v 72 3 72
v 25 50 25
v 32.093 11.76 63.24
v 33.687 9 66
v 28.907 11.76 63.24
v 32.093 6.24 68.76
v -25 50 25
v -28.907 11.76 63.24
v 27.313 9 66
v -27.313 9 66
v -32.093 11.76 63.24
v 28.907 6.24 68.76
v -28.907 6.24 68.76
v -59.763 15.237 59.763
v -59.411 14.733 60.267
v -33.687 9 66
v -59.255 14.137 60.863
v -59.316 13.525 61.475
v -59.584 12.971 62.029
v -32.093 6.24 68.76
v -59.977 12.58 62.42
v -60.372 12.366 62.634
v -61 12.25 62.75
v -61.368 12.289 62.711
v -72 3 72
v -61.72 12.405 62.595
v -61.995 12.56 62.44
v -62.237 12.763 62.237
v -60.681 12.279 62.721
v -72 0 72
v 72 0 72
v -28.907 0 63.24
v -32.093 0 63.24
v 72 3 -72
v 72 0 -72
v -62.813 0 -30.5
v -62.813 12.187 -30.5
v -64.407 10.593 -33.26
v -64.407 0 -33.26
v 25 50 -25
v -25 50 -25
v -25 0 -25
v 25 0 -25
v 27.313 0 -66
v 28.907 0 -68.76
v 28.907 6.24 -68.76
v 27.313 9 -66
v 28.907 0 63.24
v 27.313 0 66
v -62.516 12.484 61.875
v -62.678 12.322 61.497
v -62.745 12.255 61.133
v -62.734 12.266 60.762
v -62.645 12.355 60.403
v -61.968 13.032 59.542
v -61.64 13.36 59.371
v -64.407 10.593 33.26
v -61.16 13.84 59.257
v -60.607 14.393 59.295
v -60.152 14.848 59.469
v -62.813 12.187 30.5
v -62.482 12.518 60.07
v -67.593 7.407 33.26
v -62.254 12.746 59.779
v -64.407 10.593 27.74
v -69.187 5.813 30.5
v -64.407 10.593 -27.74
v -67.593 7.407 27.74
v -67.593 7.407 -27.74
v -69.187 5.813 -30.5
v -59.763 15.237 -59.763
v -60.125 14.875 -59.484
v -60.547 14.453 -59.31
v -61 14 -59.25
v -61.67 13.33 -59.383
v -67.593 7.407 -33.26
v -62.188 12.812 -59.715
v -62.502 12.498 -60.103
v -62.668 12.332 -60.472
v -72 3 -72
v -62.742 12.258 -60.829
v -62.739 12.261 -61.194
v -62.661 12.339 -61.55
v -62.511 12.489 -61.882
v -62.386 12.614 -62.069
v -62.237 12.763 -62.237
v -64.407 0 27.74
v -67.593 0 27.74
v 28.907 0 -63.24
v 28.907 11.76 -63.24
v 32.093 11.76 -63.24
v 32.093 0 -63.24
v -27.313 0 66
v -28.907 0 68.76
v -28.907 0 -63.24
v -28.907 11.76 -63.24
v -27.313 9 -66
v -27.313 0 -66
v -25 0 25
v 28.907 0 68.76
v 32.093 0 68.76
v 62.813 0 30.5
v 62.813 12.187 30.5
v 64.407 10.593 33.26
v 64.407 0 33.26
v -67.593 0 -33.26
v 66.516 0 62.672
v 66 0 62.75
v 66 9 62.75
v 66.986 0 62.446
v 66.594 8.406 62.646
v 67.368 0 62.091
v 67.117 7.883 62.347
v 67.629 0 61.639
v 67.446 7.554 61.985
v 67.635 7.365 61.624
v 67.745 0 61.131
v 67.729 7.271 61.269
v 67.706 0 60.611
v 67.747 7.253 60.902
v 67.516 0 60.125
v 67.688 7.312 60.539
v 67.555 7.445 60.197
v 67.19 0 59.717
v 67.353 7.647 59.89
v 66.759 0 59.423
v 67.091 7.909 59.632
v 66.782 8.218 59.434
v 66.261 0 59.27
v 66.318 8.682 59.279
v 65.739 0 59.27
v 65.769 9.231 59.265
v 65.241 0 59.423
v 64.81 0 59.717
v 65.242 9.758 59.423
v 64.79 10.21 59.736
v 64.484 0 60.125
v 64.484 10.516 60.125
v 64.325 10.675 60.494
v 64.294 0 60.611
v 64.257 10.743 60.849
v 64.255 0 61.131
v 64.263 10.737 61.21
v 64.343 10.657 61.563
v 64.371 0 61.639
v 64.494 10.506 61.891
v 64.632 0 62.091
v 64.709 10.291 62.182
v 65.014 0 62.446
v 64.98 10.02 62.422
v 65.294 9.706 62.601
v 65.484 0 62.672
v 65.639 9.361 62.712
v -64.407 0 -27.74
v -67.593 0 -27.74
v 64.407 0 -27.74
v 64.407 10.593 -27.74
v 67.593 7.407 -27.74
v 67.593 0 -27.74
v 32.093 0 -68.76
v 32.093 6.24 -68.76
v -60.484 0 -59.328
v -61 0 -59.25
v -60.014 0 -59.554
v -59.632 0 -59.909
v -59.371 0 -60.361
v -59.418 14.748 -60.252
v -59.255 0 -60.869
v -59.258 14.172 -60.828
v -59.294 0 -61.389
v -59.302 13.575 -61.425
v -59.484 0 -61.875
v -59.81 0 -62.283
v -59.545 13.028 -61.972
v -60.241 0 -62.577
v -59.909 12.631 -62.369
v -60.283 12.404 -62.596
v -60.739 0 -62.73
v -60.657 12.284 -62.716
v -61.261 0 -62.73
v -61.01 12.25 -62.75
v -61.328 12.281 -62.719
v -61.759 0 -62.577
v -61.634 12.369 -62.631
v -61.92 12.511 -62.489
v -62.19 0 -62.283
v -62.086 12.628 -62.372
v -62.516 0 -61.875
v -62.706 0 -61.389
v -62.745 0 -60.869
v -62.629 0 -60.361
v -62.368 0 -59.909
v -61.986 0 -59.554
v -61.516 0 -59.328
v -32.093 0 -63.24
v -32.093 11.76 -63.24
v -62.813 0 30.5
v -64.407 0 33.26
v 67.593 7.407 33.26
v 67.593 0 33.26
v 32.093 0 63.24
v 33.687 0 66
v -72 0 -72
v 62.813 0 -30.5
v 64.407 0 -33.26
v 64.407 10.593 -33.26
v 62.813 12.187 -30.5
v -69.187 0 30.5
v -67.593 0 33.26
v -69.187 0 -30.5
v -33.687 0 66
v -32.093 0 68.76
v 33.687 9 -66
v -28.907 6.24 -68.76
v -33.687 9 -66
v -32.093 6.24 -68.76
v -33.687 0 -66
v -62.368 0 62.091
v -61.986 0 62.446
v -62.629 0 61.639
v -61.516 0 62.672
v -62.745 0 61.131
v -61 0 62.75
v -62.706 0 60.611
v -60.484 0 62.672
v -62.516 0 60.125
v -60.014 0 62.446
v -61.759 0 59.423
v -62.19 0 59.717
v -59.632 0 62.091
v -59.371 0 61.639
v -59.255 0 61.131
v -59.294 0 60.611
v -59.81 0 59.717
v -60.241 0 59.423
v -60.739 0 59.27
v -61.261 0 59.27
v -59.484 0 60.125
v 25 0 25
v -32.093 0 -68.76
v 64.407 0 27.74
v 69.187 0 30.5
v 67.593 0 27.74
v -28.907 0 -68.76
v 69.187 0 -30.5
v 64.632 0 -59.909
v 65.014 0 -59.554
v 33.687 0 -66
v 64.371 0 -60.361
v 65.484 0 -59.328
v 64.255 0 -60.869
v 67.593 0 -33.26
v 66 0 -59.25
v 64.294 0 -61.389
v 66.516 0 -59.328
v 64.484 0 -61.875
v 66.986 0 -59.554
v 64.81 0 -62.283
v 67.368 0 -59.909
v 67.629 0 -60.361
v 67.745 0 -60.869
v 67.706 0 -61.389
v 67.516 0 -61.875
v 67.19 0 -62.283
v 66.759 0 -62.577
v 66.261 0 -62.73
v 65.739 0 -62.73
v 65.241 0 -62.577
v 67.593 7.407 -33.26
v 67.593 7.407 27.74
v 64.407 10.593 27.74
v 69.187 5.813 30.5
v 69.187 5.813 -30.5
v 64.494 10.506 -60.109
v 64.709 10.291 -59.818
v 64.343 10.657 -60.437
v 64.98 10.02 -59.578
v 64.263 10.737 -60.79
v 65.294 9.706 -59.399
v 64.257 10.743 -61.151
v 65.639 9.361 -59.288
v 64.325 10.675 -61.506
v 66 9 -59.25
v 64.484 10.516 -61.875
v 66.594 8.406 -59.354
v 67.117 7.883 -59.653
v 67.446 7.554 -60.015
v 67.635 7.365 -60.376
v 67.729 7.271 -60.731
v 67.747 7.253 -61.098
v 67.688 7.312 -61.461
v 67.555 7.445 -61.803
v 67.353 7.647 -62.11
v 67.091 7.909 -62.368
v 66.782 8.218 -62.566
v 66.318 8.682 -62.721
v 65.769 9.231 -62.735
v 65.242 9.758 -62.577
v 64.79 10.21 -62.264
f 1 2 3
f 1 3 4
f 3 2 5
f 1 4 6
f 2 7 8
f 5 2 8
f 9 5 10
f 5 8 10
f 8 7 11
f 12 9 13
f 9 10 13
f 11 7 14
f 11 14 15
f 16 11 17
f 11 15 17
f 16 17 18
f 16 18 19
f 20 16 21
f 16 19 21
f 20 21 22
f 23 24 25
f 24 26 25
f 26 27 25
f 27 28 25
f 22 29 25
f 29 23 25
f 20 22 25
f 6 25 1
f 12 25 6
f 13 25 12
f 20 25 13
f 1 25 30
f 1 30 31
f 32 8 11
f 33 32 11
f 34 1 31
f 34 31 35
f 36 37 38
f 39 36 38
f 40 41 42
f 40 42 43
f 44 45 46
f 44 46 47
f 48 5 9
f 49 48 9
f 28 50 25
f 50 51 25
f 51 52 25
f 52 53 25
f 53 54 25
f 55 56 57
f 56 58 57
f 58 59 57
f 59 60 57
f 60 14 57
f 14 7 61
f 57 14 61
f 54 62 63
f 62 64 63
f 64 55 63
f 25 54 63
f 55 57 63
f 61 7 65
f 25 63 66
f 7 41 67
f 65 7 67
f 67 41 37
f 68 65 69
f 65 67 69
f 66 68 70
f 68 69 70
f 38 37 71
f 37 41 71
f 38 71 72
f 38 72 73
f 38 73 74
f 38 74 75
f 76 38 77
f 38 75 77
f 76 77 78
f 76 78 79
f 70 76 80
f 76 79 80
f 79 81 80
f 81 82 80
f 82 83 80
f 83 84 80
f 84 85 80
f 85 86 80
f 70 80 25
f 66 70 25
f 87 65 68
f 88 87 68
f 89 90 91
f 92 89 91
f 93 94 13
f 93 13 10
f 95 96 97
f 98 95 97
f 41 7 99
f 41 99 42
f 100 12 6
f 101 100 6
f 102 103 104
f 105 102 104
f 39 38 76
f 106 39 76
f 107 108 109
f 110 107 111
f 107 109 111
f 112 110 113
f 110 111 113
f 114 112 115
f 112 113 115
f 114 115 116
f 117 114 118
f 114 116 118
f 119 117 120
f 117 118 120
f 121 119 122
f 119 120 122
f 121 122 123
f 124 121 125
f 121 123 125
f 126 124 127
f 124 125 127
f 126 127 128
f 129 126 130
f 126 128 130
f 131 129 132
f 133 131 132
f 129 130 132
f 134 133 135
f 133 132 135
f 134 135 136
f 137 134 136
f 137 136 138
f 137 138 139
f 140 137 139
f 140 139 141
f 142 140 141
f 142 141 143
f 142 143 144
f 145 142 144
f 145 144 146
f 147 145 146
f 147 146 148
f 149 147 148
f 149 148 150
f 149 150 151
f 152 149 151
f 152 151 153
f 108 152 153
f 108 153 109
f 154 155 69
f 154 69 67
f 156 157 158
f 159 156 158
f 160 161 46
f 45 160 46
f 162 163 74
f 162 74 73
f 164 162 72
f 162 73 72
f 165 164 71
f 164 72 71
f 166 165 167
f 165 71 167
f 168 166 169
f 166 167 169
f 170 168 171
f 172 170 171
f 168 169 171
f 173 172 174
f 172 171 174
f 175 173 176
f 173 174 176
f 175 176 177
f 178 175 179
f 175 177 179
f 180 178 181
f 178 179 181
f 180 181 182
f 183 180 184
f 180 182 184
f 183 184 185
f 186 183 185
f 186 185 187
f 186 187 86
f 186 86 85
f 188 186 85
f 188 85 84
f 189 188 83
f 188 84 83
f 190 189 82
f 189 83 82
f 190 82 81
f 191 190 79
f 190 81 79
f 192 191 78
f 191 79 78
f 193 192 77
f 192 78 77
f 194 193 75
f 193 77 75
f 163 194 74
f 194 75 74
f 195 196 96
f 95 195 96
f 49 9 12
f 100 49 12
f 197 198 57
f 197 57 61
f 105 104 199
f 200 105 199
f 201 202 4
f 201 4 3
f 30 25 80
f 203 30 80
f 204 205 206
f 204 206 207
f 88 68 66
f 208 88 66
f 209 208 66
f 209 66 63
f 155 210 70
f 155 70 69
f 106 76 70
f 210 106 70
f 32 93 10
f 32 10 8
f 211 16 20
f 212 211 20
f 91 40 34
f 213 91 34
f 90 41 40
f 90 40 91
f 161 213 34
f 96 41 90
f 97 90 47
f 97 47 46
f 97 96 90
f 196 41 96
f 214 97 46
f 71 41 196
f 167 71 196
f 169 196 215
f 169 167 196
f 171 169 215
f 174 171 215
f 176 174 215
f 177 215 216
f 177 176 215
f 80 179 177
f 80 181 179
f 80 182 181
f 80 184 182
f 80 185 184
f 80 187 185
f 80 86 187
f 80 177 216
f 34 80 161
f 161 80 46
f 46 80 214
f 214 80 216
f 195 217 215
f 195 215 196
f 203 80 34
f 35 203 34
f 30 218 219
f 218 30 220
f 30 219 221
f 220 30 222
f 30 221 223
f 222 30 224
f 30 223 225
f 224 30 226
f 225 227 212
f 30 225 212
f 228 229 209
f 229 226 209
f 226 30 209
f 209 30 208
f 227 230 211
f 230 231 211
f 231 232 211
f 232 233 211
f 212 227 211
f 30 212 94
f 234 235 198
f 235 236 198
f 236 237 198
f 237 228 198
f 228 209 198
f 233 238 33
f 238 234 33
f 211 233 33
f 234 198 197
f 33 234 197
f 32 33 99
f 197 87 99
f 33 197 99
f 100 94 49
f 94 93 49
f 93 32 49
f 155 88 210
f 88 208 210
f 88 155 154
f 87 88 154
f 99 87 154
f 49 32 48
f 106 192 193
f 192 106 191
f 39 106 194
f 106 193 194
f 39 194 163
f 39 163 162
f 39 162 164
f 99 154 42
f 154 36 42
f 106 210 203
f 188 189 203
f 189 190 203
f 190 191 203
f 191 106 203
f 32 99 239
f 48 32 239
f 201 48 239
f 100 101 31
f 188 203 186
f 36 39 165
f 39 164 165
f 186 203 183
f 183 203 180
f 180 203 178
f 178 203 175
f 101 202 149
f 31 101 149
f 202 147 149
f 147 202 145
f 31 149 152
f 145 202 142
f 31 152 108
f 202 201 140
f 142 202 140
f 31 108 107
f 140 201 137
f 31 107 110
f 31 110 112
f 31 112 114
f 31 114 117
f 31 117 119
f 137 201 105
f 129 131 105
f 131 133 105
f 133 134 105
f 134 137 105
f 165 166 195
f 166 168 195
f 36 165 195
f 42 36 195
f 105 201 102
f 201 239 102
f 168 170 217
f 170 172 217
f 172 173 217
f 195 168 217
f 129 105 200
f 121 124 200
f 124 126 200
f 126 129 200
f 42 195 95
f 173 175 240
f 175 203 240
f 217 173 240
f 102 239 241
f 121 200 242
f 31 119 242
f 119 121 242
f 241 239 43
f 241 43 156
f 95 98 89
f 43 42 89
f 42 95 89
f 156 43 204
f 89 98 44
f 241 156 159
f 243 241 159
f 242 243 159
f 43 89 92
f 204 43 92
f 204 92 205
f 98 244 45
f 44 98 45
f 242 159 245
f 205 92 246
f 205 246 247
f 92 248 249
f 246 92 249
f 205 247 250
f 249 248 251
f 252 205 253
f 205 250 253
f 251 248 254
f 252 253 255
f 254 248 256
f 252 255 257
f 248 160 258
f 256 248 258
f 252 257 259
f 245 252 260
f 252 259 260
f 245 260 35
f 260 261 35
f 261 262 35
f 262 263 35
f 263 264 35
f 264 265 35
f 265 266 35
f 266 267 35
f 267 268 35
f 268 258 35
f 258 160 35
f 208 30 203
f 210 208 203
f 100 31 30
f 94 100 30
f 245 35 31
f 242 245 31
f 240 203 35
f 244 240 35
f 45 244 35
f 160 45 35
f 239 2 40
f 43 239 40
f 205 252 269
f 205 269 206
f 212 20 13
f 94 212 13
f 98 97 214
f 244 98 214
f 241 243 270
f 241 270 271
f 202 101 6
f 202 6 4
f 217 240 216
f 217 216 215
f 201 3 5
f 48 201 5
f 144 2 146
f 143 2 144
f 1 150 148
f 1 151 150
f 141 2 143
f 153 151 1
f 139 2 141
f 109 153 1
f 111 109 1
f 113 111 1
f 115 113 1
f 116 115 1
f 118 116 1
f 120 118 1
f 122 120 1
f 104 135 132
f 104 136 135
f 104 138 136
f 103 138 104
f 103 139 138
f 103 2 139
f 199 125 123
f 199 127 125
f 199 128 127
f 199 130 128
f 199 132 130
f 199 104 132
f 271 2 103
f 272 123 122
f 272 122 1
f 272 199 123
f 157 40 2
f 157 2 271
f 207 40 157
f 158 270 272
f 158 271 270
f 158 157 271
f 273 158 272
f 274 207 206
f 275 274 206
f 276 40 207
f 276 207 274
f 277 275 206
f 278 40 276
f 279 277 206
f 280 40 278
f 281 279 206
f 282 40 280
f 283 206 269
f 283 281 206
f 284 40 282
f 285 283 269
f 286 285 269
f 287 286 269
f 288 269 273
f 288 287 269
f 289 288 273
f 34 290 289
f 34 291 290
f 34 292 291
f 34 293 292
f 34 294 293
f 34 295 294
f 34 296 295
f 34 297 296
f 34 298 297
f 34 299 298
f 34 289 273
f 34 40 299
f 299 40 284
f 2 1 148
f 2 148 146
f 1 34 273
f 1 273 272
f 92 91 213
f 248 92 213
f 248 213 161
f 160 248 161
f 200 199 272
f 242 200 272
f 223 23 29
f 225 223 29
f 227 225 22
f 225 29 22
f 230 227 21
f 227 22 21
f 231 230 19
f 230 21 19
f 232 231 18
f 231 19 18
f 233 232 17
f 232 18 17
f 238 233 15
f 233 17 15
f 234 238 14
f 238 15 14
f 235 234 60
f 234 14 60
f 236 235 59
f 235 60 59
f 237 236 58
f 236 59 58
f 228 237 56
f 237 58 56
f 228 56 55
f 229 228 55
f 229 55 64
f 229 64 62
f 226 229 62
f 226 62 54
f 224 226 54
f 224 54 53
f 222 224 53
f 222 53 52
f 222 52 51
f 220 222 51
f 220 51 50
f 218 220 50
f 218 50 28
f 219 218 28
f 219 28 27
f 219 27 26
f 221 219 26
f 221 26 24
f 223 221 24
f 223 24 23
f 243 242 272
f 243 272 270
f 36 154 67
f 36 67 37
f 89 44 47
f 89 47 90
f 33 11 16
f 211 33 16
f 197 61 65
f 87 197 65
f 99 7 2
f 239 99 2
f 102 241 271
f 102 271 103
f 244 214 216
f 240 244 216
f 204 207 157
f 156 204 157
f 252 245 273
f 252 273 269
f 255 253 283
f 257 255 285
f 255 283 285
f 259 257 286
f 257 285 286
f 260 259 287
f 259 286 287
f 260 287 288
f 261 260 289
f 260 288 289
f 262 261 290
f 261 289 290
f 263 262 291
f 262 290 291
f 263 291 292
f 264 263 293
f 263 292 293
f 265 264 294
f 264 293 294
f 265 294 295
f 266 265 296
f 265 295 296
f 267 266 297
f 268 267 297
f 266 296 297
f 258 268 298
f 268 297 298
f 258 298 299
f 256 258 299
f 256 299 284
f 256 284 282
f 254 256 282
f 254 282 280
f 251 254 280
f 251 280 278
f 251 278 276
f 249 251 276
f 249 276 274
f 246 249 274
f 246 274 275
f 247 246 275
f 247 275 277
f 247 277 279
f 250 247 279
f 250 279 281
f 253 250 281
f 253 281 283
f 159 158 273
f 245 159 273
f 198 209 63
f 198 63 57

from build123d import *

# Parameters (mm, degrees)
CROQUIS1_W                 = 140
CROQUIS1_H                 = 140
CROQUIS1_R                 = 1.5
SALIENTE_EXTRUIR1_DEPTH    = 50
CROQUIS2_R                 = 1.75
CROQUIS2_W                 = 50
CROQUIS2_H                 = 50
CORTAR_EXTRUIR1_DEPTH      = 143
CROQUIS3_W                 = 144
CROQUIS3_H                 = 144
CROQUIS3_R                 = 1.75
CROQUIS3_W_2               = 50
CROQUIS3_H_2               = 50
SALIENTE_EXTRUIR3_DEPTH    = 50
CORTAR_EXTRUIR2_REACH      = 170.582
CORTAR_EXTRUIR3_DEPTH      = 92
CORTAR_EXTRUIR3_DEPTH_BACK = 78


with BuildPart() as part:
    # Croquis1 → Saliente-Extruir1 (new body)
    with BuildSketch(Plane(origin=(0, 0, 0), x_dir=(1, 0, 0), z_dir=(0, 1, 0))):
        Rectangle(CROQUIS1_W, CROQUIS1_H)
        with Locations(Location((-61, 61, 0), (0, 0, 270))):
            Circle(CROQUIS1_R, mode=Mode.SUBTRACT)
        with Locations(Location((66, 61, 0), (0, 0, 270))):
            Circle(CROQUIS1_R, mode=Mode.SUBTRACT)
        with Locations(Location((66, -61, 0), (0, 0, 270))):
            Circle(CROQUIS1_R, mode=Mode.SUBTRACT)
        with Locations(Location((-61, -61, 0), (0, 0, 270))):
            Circle(CROQUIS1_R, mode=Mode.SUBTRACT)
        with Locations(Location((66, 30.5, 0), (0, 0, 270))):
            Circle(CROQUIS1_R, mode=Mode.SUBTRACT)
        with Locations(Location((66, -30.5, 0), (0, 0, 270))):
            Circle(CROQUIS1_R, mode=Mode.SUBTRACT)
        with Locations(Location((-30.5, -66, 0), (0, 0, 270))):
            Circle(CROQUIS1_R, mode=Mode.SUBTRACT)
        with Locations(Location((30.5, -66, 0), (0, 0, 270))):
            Circle(CROQUIS1_R, mode=Mode.SUBTRACT)
        with Locations(Location((-30.5, 66, 0), (0, 0, 90))):
            Circle(CROQUIS1_R, mode=Mode.SUBTRACT)
        with Locations(Location((30.5, 66, 0), (0, 0, 90))):
            Circle(CROQUIS1_R, mode=Mode.SUBTRACT)
        with Locations(Location((-66, 30.5, 0), (0, 0, 90))):
            Circle(CROQUIS1_R, mode=Mode.SUBTRACT)
        with Locations(Location((-66, -30.5, 0), (0, 0, 90))):
            Circle(CROQUIS1_R, mode=Mode.SUBTRACT)
    extrude(amount=SALIENTE_EXTRUIR1_DEPTH)

    # Croquis2 → Cortar-Extruir1 (cut)
    with BuildSketch(Plane(origin=(0, 50, 0), x_dir=(1, 0, 0), z_dir=(0, 1, 0))):
        with Locations(Location((66, 61, 0), (0, 0, 270))):
            Circle(CROQUIS2_R)
        with Locations(Location((-61, 61, 0), (0, 0, 270))):
            Circle(CROQUIS2_R)
        with Locations(Location((-61, -61, 0), (0, 0, 270))):
            Circle(CROQUIS2_R)
        with Locations(Location((66, -61, 0), (0, 0, 270))):
            Circle(CROQUIS2_R)
        Polygon((-28.906513257, 63.24), (-27.313026514, 66), (-28.906513257, 68.76), (-32.093486743, 68.76), (-33.686973486, 66), (-32.093486743, 63.24), align=None)
        Polygon((32.093486743, 63.24), (33.686973486, 66), (32.093486743, 68.76), (28.906513257, 68.76), (27.313026514, 66), (28.906513257, 63.24), align=None)
        Polygon((67.593486743, 27.74), (69.186973486, 30.5), (67.593486743, 33.26), (64.406513257, 33.26), (62.813026514, 30.5), (64.406513257, 27.74), align=None)
        Polygon((67.593486743, -33.26), (69.186973486, -30.5), (67.593486743, -27.74), (64.406513257, -27.74), (62.813026514, -30.5), (64.406513257, -33.26), align=None)
        Polygon((32.093486743, -68.76), (33.686973486, -66), (32.093486743, -63.24), (28.906513257, -63.24), (27.313026514, -66), (28.906513257, -68.76), align=None)
        Polygon((-28.906513257, -68.76), (-27.313026514, -66), (-28.906513257, -63.24), (-32.093486743, -63.24), (-33.686973486, -66), (-32.093486743, -68.76), align=None)
        Polygon((-64.406513257, -33.26), (-62.813026514, -30.5), (-64.406513257, -27.74), (-67.593486743, -27.74), (-69.186973486, -30.5), (-67.593486743, -33.26), align=None)
        Polygon((-64.406513257, 27.74), (-62.813026514, 30.5), (-64.406513257, 33.26), (-67.593486743, 33.26), (-69.186973486, 30.5), (-67.593486743, 27.74), align=None)
        Rectangle(CROQUIS2_W, CROQUIS2_H)
    extrude(amount=-CORTAR_EXTRUIR1_DEPTH, mode=Mode.SUBTRACT)

    # Croquis3 → Saliente-Extruir3 (add)
    with BuildSketch(Plane(origin=(0, 50, 0), x_dir=(1, 0, 0), z_dir=(0, 1, 0))):
        Rectangle(CROQUIS3_W, CROQUIS3_H)
        with Locations(Location((-61, -61, 0), (0, 0, 270))):
            Circle(CROQUIS3_R, mode=Mode.SUBTRACT)
        with Locations(Location((-61, 61, 0), (0, 0, 270))):
            Circle(CROQUIS3_R, mode=Mode.SUBTRACT)
        with Locations(Location((66, 61, 0), (0, 0, 270))):
            Circle(CROQUIS3_R, mode=Mode.SUBTRACT)
        with Locations(Location((66, -61, 0), (0, 0, 270))):
            Circle(CROQUIS3_R, mode=Mode.SUBTRACT)
        Rectangle(CROQUIS3_W_2, CROQUIS3_H_2, mode=Mode.SUBTRACT)
        Polygon((-33.686973486, -66), (-32.093486743, -68.76), (-28.906513257, -68.76), (-27.313026514, -66), (-28.906513257, -63.24), (-32.093486743, -63.24), align=None, mode=Mode.SUBTRACT)
        Polygon((-67.593486743, -33.26), (-64.406513257, -33.26), (-62.813026514, -30.5), (-64.406513257, -27.74), (-67.593486743, -27.74), (-69.186973486, -30.5), align=None, mode=Mode.SUBTRACT)
        Polygon((28.906513257, 63.24), (32.093486743, 63.24), (33.686973486, 66), (32.093486743, 68.76), (28.906513257, 68.76), (27.313026514, 66), align=None, mode=Mode.SUBTRACT)
        Polygon((-33.686973486, 66), (-32.093486743, 63.24), (-28.906513257, 63.24), (-27.313026514, 66), (-28.906513257, 68.76), (-32.093486743, 68.76), align=None, mode=Mode.SUBTRACT)
        Polygon((62.813026514, 30.5), (64.406513257, 27.74), (67.593486743, 27.74), (69.186973486, 30.5), (67.593486743, 33.26), (64.406513257, 33.26), align=None, mode=Mode.SUBTRACT)
        Polygon((67.593486743, -33.26), (69.186973486, -30.5), (67.593486743, -27.74), (64.406513257, -27.74), (62.813026514, -30.5), (64.406513257, -33.26), align=None, mode=Mode.SUBTRACT)
        Polygon((33.686973486, -66), (32.093486743, -63.24), (28.906513257, -63.24), (27.313026514, -66), (28.906513257, -68.76), (32.093486743, -68.76), align=None, mode=Mode.SUBTRACT)
        Polygon((-64.406513257, 27.74), (-62.813026514, 30.5), (-64.406513257, 33.26), (-67.593486743, 33.26), (-69.186973486, 30.5), (-67.593486743, 27.74), align=None, mode=Mode.SUBTRACT)
    extrude(amount=-SALIENTE_EXTRUIR3_DEPTH)

    # Cortar-Extruir2: up to this face of the body (flat: up to its plane)
    cortar_extruir2_end = Plane(part.part.faces().sort_by_distance((72, 25, 0))[0])
    # Croquis4 → Cortar-Extruir2 (cut, up to the picked face)
    with BuildSketch(Plane.ZY.offset(72), mode=Mode.PRIVATE) as cortar_extruir2_sk1:
        Polygon((-25, 50), (-72, 3), (-72, 50), align=None)
    cortar_extruir2_tool1 = split(extrude(cortar_extruir2_sk1.sketch, amount=-CORTAR_EXTRUIR2_REACH, mode=Mode.PRIVATE), bisect_by=cortar_extruir2_end, keep=Keep.BOTH, mode=Mode.PRIVATE)
    # Croquis4 → Cortar-Extruir2 (cut, up to the picked face)
    with BuildSketch(Plane.ZY.offset(72), mode=Mode.PRIVATE) as cortar_extruir2_sk2:
        Polygon((72, 3), (72, 50), (25, 50), align=None)
    cortar_extruir2_tool2 = split(extrude(cortar_extruir2_sk2.sketch, amount=-CORTAR_EXTRUIR2_REACH, mode=Mode.PRIVATE), bisect_by=cortar_extruir2_end, keep=Keep.BOTH, mode=Mode.PRIVATE)
    add(cortar_extruir2_tool1.solids().sort_by(Axis((-72, 34.333333, -56.333333), (1, 0, 0)))[0], mode=Mode.SUBTRACT)
    add(cortar_extruir2_tool2.solids().sort_by(Axis((-72, 34.333333, 56.333333), (1, 0, 0)))[0], mode=Mode.SUBTRACT)

    # Croquis5 → Cortar-Extruir3 (cut, two sides: drawn at the far end of the back side and taken through both)
    with BuildSketch(Plane.XY.offset(-CORTAR_EXTRUIR3_DEPTH_BACK)):
        Polygon((-25, 50), (-72, 3), (-72, 50), align=None)
        Polygon((25, 50), (72, 3), (72, 50), align=None)
    extrude(amount=CORTAR_EXTRUIR3_DEPTH + CORTAR_EXTRUIR3_DEPTH_BACK, mode=Mode.SUBTRACT)


solid = part.part
